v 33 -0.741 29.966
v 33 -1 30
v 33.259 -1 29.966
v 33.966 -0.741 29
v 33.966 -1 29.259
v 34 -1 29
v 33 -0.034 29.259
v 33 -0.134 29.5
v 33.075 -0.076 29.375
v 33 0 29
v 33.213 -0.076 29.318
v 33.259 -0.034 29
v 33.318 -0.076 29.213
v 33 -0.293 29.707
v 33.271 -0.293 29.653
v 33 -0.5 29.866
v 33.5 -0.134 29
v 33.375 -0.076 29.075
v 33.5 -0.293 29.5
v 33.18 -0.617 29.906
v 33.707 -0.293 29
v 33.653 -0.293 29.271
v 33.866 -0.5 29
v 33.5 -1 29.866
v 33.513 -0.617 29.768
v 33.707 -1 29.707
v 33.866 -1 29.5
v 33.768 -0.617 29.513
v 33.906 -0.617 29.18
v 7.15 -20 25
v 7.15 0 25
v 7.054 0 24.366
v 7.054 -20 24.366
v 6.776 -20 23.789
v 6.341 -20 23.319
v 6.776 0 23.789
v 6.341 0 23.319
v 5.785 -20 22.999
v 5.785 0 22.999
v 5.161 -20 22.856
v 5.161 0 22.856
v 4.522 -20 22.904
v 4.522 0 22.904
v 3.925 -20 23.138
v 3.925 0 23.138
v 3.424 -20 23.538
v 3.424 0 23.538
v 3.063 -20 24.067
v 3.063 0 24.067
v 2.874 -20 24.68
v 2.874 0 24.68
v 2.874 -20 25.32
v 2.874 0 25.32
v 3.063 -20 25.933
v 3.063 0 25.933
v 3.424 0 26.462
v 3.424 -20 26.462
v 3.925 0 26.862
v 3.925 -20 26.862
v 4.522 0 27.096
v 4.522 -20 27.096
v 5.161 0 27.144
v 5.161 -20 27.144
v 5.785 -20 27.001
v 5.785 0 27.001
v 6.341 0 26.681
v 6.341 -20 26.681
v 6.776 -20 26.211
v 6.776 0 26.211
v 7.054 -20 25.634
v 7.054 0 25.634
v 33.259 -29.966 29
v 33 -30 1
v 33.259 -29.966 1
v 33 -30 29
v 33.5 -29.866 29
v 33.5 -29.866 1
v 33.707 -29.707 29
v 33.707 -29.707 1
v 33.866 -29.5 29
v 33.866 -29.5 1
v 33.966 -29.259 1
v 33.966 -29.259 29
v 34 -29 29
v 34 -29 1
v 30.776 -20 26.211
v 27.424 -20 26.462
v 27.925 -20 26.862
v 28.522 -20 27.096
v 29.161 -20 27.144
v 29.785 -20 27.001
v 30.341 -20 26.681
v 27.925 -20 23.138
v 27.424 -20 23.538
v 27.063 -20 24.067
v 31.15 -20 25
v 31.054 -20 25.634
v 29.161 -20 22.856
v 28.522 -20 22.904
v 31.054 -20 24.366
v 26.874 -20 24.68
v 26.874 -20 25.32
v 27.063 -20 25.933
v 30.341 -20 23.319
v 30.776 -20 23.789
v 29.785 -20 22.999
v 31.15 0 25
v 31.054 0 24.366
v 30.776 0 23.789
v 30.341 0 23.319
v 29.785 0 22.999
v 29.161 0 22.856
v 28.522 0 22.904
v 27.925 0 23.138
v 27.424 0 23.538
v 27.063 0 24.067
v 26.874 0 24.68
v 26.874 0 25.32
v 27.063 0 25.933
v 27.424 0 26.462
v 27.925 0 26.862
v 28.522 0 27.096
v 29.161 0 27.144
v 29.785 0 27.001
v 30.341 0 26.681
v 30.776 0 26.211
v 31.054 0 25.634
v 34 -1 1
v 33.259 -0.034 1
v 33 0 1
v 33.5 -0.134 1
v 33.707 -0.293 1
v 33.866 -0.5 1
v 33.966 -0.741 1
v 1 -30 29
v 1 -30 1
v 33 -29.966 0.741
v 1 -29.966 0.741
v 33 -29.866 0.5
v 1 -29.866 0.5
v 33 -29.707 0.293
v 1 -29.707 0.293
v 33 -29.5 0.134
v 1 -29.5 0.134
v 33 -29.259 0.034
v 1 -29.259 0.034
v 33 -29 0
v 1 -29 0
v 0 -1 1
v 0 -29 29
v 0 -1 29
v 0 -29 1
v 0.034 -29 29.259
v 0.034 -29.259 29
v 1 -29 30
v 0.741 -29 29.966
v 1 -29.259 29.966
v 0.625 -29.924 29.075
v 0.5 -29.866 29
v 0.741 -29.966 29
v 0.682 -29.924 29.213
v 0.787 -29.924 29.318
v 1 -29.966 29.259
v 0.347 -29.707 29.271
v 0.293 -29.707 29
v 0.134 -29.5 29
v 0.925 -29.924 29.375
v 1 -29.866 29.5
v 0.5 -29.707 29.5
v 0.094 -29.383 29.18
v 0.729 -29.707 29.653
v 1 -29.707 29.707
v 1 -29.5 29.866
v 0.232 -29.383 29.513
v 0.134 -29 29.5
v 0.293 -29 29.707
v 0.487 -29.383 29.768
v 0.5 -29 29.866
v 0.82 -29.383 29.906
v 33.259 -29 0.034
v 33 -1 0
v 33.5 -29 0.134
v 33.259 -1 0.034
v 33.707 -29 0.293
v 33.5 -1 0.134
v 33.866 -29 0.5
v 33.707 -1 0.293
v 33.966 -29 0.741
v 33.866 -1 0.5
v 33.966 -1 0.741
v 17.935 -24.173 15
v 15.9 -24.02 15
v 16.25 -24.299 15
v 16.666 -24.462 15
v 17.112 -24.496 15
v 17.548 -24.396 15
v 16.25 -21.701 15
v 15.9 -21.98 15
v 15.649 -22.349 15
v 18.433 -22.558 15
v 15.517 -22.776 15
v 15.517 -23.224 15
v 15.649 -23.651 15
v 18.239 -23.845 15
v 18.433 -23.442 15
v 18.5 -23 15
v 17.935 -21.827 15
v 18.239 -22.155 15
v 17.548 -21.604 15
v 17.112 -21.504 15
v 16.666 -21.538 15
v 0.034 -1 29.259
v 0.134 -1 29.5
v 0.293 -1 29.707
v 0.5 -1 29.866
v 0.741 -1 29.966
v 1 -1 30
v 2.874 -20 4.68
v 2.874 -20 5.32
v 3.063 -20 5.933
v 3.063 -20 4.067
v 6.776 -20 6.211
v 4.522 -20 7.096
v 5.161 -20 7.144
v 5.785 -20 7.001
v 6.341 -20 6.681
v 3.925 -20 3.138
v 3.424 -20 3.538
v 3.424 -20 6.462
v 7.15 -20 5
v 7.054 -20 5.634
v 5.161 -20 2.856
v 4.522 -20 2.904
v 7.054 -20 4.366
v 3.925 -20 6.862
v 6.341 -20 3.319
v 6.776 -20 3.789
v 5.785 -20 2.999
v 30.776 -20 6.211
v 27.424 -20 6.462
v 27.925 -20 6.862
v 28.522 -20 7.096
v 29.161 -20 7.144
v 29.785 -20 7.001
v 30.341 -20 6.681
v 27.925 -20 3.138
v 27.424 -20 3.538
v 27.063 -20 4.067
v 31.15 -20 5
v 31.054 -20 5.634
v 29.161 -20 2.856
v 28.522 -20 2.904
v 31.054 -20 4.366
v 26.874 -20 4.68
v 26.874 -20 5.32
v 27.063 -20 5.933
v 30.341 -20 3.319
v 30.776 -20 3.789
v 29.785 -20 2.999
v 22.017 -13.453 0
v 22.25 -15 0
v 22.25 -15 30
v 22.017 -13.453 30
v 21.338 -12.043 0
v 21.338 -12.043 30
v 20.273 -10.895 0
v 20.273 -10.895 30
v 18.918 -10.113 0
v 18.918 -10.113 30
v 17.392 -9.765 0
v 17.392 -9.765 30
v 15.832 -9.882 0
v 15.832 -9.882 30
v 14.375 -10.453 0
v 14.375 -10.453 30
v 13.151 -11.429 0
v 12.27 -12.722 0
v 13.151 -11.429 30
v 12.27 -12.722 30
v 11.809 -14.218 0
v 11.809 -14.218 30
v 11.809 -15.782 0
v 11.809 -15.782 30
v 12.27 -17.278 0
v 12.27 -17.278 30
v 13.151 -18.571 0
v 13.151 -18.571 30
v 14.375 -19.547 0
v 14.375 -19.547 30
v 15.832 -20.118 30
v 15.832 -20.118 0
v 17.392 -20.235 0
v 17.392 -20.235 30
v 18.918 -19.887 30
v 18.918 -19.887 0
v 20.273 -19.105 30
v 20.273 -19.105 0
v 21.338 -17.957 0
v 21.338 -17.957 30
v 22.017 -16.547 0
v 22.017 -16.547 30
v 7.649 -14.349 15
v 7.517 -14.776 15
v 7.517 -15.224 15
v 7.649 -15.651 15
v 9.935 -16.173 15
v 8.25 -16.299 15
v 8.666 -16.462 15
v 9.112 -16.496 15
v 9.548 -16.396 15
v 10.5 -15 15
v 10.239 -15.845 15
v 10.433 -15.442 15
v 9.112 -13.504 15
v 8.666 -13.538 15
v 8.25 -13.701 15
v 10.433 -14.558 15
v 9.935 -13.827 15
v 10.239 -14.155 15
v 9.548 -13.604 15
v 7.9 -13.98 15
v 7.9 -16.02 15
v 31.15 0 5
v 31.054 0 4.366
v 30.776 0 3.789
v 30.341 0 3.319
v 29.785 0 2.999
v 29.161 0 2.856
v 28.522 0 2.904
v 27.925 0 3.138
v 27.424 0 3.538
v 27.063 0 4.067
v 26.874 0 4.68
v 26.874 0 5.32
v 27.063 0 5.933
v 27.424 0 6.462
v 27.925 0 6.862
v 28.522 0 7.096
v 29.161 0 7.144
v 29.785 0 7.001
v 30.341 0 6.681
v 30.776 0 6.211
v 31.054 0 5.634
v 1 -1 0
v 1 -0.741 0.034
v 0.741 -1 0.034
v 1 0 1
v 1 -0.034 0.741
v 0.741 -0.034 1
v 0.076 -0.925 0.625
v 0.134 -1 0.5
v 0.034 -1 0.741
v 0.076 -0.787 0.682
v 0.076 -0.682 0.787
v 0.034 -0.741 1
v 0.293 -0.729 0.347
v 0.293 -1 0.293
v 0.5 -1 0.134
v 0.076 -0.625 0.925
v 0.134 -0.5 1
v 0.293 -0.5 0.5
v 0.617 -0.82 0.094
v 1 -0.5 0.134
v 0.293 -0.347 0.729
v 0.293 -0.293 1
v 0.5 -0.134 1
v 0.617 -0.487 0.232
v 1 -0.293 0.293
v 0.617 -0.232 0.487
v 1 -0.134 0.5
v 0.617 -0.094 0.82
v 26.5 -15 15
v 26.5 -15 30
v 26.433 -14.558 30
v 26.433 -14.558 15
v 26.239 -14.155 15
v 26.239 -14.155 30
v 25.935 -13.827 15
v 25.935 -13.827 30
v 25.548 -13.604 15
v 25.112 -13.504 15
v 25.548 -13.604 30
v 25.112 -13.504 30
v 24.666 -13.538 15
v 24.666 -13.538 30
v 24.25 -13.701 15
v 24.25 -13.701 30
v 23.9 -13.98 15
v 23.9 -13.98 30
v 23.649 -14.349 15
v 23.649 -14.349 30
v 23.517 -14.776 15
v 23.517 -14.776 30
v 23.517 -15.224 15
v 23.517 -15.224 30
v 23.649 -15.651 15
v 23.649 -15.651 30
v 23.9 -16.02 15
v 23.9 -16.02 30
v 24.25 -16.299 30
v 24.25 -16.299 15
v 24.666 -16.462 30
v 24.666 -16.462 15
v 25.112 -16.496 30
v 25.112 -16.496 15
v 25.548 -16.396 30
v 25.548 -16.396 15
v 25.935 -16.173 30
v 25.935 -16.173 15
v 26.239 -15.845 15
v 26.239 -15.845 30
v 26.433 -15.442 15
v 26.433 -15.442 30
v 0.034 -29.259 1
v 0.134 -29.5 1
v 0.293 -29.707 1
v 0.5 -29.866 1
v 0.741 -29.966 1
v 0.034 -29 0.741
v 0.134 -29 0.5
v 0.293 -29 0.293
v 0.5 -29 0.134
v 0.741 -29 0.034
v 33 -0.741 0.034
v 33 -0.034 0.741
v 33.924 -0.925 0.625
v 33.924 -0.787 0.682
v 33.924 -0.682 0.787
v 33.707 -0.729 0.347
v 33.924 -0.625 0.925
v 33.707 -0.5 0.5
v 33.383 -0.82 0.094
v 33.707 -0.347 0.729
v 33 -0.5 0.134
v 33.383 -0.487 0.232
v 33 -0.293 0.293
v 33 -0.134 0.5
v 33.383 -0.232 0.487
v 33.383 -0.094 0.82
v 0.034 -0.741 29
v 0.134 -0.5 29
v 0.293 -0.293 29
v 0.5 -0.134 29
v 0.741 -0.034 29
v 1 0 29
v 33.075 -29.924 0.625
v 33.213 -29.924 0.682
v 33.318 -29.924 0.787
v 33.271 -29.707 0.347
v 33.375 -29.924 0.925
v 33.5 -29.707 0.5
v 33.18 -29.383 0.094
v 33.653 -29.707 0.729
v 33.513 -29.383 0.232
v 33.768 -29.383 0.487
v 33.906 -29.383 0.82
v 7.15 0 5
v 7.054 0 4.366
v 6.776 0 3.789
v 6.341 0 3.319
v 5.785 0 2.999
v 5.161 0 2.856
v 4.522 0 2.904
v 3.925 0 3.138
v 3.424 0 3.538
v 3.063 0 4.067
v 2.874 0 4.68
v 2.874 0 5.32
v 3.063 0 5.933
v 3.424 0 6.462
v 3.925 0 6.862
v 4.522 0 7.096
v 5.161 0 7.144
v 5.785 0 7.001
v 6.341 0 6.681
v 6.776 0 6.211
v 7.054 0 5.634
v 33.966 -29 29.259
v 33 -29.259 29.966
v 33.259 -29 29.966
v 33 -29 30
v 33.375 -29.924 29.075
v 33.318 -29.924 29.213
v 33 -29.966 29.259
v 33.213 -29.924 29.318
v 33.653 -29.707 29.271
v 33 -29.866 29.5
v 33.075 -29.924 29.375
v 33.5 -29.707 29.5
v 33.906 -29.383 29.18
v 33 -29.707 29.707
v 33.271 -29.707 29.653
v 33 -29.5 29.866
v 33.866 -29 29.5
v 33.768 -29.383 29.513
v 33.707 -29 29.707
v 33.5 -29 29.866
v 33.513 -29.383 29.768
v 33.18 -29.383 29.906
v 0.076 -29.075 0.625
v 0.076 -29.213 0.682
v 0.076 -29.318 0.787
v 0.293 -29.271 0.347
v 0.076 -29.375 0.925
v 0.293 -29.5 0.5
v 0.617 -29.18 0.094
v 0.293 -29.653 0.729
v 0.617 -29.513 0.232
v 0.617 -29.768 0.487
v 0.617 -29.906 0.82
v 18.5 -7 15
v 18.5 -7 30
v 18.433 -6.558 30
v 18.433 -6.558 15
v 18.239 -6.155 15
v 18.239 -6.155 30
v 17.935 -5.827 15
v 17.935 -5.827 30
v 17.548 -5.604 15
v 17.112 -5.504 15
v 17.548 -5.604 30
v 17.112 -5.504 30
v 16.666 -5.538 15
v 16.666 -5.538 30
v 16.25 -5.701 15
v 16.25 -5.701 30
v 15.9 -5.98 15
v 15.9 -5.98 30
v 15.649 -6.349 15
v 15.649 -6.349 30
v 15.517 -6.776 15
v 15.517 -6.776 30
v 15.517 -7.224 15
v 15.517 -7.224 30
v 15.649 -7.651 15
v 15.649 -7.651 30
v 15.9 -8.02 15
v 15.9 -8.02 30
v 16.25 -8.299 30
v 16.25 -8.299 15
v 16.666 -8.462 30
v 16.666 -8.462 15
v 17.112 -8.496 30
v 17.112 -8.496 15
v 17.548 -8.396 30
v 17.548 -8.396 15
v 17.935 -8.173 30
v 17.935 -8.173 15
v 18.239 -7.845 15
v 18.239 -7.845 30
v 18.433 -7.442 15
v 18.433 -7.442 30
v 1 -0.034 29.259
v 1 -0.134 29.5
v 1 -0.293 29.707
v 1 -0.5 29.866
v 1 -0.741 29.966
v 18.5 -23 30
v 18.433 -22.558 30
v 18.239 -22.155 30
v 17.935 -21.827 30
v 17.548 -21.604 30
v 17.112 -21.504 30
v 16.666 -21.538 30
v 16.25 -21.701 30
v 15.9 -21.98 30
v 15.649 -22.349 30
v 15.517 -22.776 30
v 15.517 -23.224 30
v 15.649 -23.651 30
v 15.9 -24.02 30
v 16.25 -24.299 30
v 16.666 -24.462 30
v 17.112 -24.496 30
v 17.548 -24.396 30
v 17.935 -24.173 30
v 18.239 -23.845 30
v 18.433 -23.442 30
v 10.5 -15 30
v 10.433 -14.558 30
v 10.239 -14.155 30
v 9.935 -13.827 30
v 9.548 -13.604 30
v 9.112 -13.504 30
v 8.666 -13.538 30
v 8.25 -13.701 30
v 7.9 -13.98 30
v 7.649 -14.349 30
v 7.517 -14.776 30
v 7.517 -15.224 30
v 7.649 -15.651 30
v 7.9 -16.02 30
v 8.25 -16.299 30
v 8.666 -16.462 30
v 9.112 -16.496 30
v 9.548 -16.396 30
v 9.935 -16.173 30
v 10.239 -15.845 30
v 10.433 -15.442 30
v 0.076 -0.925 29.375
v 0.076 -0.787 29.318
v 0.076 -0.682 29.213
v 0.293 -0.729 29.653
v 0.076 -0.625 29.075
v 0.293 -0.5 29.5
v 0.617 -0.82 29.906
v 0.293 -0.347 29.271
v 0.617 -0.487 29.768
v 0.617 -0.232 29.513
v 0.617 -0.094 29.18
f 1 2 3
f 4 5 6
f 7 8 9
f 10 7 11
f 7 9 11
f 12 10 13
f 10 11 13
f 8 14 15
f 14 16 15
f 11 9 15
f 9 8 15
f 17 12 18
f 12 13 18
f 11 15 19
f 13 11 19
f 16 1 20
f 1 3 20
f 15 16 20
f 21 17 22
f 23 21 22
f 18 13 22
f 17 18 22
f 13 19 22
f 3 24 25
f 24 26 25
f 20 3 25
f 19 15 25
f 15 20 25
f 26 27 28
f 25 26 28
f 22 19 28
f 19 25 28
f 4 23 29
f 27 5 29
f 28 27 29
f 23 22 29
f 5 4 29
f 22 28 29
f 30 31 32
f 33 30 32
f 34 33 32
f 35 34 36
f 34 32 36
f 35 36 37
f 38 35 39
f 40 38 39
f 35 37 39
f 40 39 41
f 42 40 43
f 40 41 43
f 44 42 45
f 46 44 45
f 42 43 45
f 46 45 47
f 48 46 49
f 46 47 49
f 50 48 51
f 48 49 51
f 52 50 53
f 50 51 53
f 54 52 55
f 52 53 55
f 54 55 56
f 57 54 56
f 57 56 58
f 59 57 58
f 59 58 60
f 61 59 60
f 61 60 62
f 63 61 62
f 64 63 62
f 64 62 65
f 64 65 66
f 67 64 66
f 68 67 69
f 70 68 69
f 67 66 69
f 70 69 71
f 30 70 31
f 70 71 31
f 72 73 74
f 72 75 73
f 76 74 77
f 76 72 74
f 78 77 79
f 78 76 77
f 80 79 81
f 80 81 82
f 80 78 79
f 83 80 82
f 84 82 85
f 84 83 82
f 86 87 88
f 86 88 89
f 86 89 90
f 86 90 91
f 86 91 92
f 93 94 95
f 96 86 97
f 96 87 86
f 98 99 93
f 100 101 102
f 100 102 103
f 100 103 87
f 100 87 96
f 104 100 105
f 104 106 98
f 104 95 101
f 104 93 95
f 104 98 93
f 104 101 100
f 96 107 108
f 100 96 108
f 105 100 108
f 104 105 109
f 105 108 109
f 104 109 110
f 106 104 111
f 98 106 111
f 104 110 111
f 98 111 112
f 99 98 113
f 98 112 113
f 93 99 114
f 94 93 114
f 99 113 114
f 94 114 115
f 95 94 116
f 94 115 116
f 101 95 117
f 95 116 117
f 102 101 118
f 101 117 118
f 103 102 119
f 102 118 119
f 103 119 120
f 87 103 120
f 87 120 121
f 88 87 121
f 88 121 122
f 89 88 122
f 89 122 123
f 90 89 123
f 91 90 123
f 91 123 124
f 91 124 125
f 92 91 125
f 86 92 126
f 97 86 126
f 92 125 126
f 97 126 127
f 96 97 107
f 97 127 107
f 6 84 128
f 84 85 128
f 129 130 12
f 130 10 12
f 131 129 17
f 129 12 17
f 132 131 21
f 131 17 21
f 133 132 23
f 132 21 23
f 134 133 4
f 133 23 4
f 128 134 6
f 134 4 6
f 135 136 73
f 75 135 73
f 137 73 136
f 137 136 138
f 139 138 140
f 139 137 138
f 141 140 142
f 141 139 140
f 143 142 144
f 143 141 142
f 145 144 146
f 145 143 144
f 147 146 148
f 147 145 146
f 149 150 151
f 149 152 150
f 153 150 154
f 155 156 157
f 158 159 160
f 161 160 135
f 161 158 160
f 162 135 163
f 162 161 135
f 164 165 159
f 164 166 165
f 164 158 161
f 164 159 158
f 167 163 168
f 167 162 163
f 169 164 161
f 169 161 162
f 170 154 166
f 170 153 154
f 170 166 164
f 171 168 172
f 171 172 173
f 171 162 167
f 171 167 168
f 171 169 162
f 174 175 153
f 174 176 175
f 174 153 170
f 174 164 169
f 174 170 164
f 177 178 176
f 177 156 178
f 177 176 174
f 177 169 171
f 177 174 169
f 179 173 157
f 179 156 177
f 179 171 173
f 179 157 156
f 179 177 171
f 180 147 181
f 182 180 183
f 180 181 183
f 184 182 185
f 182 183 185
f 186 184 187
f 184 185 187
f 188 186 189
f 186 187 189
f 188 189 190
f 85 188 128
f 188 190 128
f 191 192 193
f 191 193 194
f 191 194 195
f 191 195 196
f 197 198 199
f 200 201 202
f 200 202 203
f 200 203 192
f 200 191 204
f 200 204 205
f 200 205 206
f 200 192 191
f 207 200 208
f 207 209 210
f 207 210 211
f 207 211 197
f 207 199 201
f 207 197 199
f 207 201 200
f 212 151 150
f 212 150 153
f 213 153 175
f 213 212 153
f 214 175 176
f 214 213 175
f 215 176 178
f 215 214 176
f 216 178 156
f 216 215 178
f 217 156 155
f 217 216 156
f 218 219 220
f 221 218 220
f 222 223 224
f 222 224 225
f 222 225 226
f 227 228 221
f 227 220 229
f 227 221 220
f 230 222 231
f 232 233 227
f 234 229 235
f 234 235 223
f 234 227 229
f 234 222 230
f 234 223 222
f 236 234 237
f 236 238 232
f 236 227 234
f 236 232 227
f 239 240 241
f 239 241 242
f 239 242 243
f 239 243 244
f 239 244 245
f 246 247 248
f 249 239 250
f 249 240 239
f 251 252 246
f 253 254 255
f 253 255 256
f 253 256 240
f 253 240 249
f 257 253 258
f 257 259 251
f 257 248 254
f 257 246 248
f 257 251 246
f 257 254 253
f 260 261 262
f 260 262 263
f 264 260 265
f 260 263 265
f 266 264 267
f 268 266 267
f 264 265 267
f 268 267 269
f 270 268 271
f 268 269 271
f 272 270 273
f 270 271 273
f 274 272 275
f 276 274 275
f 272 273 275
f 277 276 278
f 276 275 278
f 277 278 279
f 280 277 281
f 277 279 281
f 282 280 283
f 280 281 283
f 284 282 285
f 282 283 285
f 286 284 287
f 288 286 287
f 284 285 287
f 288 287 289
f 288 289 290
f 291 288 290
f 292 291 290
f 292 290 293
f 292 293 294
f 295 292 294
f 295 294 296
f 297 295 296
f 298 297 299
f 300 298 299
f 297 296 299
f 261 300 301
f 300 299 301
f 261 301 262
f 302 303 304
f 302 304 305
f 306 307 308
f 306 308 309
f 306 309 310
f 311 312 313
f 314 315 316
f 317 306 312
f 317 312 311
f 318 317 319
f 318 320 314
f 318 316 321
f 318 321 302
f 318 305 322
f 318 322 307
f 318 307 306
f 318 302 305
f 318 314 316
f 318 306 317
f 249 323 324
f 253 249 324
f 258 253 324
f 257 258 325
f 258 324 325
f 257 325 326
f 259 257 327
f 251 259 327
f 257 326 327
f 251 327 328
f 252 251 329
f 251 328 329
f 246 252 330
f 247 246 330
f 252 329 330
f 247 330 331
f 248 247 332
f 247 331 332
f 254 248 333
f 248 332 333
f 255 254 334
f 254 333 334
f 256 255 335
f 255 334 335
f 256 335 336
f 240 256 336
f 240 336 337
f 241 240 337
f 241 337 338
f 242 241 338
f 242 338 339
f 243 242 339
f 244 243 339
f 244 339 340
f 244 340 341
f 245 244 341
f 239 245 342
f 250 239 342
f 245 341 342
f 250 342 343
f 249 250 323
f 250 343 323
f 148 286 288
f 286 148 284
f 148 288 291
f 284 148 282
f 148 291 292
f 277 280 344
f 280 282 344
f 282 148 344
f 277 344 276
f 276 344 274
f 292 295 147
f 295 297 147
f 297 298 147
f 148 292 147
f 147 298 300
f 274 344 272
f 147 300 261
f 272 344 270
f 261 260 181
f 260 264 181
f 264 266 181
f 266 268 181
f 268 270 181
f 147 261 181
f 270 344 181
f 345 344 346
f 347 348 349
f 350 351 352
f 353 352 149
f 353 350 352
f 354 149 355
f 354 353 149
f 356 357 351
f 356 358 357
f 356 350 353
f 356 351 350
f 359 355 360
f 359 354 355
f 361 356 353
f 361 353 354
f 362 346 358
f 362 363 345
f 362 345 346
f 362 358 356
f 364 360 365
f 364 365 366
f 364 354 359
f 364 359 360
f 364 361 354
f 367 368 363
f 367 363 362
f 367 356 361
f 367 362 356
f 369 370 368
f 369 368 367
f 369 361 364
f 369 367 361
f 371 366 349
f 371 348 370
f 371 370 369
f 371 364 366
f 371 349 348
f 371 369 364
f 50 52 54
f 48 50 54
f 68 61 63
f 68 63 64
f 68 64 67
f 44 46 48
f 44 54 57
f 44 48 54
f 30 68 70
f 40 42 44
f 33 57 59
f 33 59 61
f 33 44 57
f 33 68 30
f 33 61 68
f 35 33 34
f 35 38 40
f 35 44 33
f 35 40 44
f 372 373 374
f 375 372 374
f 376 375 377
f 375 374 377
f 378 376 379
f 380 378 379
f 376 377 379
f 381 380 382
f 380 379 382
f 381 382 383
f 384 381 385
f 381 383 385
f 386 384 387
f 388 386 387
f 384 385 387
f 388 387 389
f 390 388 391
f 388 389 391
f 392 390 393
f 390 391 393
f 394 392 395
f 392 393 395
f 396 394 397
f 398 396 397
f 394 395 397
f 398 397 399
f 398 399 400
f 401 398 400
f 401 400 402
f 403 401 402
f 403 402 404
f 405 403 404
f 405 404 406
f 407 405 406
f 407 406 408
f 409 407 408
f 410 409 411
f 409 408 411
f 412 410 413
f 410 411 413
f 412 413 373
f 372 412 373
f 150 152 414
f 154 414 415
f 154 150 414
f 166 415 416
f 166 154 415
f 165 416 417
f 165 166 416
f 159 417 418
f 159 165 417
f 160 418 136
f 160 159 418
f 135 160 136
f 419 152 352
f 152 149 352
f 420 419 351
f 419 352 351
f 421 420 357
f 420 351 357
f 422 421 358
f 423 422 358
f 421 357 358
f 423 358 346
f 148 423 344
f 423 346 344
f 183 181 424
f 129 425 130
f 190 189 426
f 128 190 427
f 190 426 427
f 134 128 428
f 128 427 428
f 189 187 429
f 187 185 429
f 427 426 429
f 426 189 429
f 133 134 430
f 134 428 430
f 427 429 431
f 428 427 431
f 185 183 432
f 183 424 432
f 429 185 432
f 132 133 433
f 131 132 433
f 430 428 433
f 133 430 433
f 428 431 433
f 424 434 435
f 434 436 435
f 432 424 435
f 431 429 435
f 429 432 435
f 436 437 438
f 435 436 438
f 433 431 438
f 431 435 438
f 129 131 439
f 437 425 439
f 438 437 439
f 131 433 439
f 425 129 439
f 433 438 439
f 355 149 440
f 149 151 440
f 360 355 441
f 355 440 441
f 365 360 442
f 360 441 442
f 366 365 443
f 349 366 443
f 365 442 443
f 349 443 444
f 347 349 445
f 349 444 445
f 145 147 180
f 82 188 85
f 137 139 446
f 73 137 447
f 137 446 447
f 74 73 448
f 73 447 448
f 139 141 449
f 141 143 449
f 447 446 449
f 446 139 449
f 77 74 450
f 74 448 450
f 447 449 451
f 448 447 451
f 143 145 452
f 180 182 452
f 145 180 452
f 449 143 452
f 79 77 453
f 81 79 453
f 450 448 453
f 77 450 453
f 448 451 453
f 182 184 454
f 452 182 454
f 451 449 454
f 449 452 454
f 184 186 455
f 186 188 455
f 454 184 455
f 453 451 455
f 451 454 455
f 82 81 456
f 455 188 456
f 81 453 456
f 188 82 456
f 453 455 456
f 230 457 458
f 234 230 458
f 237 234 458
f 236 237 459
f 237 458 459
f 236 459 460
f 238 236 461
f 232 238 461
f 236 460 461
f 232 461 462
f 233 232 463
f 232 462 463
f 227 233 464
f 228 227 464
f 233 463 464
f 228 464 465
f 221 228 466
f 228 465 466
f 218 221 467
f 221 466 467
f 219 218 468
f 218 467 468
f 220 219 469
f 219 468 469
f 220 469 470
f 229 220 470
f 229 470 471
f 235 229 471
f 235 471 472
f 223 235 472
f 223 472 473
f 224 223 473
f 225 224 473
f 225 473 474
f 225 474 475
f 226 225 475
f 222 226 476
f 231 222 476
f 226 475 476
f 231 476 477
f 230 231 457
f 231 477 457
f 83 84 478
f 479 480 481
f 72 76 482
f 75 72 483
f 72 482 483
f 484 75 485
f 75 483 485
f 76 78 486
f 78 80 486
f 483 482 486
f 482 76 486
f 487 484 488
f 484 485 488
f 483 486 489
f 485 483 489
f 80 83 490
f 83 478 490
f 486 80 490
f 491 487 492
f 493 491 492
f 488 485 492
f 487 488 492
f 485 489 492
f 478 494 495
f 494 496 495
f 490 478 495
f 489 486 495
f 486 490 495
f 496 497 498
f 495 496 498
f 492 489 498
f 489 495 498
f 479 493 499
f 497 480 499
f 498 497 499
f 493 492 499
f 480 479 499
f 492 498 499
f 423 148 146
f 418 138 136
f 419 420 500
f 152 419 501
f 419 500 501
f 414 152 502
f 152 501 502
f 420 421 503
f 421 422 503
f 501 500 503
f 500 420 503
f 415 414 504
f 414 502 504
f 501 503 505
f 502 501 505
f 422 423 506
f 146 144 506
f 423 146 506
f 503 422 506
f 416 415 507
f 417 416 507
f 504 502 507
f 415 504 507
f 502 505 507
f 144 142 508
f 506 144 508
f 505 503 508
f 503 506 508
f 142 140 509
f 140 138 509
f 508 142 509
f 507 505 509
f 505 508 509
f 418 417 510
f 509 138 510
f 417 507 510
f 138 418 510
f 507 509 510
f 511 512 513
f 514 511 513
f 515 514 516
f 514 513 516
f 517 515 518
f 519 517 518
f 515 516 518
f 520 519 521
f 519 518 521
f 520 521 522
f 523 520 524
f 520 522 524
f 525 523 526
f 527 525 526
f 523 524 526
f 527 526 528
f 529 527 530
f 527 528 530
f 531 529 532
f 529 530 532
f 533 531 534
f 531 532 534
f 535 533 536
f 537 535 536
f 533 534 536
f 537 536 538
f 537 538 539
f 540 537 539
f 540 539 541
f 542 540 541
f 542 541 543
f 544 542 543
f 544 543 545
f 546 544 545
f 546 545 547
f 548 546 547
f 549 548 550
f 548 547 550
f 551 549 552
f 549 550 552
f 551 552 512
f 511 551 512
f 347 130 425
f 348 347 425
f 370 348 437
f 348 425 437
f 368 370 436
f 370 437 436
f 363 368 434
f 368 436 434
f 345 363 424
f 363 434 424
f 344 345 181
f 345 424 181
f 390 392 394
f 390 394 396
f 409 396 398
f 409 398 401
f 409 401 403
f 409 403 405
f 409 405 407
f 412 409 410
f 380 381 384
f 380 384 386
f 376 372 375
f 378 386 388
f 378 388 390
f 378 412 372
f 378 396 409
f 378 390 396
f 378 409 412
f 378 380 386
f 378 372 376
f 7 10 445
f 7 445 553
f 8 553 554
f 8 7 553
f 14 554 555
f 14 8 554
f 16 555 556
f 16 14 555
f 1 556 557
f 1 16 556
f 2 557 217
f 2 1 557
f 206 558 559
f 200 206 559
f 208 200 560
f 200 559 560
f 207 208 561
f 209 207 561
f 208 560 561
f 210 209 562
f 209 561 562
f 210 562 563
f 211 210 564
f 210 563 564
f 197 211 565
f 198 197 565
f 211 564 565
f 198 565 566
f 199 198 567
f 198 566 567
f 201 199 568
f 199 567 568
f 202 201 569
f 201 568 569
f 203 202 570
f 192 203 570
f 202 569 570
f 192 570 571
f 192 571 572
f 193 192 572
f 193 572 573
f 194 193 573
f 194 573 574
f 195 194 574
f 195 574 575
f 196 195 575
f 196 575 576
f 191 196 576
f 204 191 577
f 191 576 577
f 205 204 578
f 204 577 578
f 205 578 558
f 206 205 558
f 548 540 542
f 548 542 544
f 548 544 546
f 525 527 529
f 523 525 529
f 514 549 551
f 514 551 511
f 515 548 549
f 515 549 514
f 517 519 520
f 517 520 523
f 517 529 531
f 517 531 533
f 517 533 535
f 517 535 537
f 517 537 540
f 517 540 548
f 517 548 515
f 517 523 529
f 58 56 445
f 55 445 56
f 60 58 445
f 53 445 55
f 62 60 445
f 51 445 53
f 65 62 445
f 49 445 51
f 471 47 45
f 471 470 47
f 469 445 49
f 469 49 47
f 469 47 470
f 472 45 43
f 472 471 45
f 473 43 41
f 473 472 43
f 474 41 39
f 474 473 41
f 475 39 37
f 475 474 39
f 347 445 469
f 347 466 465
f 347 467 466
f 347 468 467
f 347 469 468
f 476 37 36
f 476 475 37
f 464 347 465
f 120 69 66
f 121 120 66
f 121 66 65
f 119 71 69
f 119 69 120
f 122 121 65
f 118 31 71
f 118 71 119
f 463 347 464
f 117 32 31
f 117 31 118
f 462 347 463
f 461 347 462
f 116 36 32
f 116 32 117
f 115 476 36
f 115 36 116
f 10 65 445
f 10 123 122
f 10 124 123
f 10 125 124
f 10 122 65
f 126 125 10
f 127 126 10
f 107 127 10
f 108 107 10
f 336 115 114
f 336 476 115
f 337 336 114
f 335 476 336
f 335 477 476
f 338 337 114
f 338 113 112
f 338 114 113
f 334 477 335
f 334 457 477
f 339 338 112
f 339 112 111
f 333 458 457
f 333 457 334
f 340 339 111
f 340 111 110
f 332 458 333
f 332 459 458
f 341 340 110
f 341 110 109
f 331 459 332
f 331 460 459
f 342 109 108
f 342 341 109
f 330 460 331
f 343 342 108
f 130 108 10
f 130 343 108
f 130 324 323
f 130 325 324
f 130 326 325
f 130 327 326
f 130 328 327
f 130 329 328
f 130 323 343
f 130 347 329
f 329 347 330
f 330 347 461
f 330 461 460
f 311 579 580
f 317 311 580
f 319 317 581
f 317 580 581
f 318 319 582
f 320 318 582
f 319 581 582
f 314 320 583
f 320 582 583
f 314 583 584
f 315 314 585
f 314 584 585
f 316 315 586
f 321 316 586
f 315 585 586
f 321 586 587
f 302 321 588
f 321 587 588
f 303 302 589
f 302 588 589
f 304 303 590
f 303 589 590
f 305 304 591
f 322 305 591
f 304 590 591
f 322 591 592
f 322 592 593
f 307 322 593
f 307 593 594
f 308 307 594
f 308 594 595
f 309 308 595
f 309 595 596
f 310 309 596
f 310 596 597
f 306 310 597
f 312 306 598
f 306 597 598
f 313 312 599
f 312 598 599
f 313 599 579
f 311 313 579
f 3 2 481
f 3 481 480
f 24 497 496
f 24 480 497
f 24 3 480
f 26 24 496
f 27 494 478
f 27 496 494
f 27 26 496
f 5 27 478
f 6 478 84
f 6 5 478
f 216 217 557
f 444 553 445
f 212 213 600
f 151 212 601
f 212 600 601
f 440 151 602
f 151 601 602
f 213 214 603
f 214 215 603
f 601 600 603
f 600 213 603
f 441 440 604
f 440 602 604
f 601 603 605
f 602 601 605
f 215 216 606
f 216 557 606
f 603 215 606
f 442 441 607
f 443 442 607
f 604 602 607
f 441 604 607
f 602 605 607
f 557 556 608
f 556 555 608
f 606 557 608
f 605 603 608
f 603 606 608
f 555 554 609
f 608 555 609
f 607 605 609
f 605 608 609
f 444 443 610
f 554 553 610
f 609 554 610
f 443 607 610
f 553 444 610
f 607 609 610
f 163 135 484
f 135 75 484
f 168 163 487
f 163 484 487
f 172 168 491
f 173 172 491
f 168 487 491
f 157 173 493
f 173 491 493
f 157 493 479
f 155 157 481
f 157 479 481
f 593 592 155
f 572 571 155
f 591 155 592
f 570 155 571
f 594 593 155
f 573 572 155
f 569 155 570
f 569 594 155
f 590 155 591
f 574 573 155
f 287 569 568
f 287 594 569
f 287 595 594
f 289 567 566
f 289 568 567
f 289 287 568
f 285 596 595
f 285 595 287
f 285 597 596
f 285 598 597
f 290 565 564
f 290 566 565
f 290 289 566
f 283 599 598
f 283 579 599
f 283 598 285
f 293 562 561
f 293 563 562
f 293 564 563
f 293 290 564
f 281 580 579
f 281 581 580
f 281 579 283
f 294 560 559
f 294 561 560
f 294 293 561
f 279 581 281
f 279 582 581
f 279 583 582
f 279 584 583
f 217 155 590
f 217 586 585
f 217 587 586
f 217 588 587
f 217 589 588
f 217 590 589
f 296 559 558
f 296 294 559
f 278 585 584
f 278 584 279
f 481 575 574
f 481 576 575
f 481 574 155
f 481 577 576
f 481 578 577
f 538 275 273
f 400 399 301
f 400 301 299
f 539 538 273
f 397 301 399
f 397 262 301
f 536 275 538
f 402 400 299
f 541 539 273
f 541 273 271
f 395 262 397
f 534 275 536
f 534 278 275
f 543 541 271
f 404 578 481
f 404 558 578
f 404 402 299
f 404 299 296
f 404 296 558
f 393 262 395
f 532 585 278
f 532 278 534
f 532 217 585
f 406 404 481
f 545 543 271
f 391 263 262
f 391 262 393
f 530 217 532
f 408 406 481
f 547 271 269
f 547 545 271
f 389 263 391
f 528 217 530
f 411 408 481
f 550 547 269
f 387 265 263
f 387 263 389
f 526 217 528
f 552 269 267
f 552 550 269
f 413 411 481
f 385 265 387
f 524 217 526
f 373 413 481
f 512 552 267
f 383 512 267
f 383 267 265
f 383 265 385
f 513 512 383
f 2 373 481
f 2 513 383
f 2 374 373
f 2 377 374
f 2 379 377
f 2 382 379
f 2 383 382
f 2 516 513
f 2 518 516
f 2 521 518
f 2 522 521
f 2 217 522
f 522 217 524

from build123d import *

# Parameters (mm, degrees)
SKETCH1_W           = 34
SKETCH1_H           = 30
BOSS_EXTRUDE1_DEPTH = 30
SKETCH2_R           = 5.25
CUT_EXTRUDE1_DEPTH  = 30
SKETCH3_R           = 1.5
CUT_EXTRUDE2_DEPTH  = 15
FILLET1_R           = 1
SKETCH4_R           = 2.15
CUT_EXTRUDE3_DEPTH  = 20


with BuildPart() as part:
    # Sketch1 → Boss-Extrude1 (new body)
    with BuildSketch(Plane.XY):
        with Locations((17, -15)):
            Rectangle(SKETCH1_W, SKETCH1_H)
    extrude(amount=BOSS_EXTRUDE1_DEPTH)

    # Sketch2 → Cut-Extrude1 (cut)
    with BuildSketch(Plane.XY.offset(30)):
        with Locations((17, -15)):
            Circle(SKETCH2_R)
    extrude(amount=-CUT_EXTRUDE1_DEPTH, mode=Mode.SUBTRACT)

    # Sketch3 → Cut-Extrude2 (cut)
    with BuildSketch(Plane.XY.offset(30)):
        with Locations((25, -15)):
            Circle(SKETCH3_R)
        with Locations((17, -7)):
            Circle(SKETCH3_R)
        with Locations((9, -15)):
            Circle(SKETCH3_R)
        with Locations((17, -23)):
            Circle(SKETCH3_R)
    extrude(amount=-CUT_EXTRUDE2_DEPTH, mode=Mode.SUBTRACT)

    # Fillet1
    fillet1_edges = [part.edges().sort_by_distance(p)[0] for p in [
        (34, -15, 30),
        (17, 0, 30),
        (0, -15, 30),
        (17, 0, 0),
        (34, -15, 0),
        (17, -30, 0),
        (0, -15, 0),
        (0, 0, 15),
        (34, 0, 15),
        (34, -30, 15),
        (0, -30, 15),
        (17, -30, 30),
    ]]
    fillet(fillet1_edges, radius=FILLET1_R)

    # Sketch4 → Cut-Extrude3 (cut)
    with BuildSketch(Plane(origin=(0, 0, 0), x_dir=(1, 0, 0), z_dir=(0, 1, 0))):
        with Locations((5, -5)):
            Circle(SKETCH4_R)
        with Locations((29, -5)):
            Circle(SKETCH4_R)
        with Locations((29, -25)):
            Circle(SKETCH4_R)
        with Locations((5, -25)):
            Circle(SKETCH4_R)
    extrude(amount=-CUT_EXTRUDE3_DEPTH, mode=Mode.SUBTRACT)


solid = part.part
